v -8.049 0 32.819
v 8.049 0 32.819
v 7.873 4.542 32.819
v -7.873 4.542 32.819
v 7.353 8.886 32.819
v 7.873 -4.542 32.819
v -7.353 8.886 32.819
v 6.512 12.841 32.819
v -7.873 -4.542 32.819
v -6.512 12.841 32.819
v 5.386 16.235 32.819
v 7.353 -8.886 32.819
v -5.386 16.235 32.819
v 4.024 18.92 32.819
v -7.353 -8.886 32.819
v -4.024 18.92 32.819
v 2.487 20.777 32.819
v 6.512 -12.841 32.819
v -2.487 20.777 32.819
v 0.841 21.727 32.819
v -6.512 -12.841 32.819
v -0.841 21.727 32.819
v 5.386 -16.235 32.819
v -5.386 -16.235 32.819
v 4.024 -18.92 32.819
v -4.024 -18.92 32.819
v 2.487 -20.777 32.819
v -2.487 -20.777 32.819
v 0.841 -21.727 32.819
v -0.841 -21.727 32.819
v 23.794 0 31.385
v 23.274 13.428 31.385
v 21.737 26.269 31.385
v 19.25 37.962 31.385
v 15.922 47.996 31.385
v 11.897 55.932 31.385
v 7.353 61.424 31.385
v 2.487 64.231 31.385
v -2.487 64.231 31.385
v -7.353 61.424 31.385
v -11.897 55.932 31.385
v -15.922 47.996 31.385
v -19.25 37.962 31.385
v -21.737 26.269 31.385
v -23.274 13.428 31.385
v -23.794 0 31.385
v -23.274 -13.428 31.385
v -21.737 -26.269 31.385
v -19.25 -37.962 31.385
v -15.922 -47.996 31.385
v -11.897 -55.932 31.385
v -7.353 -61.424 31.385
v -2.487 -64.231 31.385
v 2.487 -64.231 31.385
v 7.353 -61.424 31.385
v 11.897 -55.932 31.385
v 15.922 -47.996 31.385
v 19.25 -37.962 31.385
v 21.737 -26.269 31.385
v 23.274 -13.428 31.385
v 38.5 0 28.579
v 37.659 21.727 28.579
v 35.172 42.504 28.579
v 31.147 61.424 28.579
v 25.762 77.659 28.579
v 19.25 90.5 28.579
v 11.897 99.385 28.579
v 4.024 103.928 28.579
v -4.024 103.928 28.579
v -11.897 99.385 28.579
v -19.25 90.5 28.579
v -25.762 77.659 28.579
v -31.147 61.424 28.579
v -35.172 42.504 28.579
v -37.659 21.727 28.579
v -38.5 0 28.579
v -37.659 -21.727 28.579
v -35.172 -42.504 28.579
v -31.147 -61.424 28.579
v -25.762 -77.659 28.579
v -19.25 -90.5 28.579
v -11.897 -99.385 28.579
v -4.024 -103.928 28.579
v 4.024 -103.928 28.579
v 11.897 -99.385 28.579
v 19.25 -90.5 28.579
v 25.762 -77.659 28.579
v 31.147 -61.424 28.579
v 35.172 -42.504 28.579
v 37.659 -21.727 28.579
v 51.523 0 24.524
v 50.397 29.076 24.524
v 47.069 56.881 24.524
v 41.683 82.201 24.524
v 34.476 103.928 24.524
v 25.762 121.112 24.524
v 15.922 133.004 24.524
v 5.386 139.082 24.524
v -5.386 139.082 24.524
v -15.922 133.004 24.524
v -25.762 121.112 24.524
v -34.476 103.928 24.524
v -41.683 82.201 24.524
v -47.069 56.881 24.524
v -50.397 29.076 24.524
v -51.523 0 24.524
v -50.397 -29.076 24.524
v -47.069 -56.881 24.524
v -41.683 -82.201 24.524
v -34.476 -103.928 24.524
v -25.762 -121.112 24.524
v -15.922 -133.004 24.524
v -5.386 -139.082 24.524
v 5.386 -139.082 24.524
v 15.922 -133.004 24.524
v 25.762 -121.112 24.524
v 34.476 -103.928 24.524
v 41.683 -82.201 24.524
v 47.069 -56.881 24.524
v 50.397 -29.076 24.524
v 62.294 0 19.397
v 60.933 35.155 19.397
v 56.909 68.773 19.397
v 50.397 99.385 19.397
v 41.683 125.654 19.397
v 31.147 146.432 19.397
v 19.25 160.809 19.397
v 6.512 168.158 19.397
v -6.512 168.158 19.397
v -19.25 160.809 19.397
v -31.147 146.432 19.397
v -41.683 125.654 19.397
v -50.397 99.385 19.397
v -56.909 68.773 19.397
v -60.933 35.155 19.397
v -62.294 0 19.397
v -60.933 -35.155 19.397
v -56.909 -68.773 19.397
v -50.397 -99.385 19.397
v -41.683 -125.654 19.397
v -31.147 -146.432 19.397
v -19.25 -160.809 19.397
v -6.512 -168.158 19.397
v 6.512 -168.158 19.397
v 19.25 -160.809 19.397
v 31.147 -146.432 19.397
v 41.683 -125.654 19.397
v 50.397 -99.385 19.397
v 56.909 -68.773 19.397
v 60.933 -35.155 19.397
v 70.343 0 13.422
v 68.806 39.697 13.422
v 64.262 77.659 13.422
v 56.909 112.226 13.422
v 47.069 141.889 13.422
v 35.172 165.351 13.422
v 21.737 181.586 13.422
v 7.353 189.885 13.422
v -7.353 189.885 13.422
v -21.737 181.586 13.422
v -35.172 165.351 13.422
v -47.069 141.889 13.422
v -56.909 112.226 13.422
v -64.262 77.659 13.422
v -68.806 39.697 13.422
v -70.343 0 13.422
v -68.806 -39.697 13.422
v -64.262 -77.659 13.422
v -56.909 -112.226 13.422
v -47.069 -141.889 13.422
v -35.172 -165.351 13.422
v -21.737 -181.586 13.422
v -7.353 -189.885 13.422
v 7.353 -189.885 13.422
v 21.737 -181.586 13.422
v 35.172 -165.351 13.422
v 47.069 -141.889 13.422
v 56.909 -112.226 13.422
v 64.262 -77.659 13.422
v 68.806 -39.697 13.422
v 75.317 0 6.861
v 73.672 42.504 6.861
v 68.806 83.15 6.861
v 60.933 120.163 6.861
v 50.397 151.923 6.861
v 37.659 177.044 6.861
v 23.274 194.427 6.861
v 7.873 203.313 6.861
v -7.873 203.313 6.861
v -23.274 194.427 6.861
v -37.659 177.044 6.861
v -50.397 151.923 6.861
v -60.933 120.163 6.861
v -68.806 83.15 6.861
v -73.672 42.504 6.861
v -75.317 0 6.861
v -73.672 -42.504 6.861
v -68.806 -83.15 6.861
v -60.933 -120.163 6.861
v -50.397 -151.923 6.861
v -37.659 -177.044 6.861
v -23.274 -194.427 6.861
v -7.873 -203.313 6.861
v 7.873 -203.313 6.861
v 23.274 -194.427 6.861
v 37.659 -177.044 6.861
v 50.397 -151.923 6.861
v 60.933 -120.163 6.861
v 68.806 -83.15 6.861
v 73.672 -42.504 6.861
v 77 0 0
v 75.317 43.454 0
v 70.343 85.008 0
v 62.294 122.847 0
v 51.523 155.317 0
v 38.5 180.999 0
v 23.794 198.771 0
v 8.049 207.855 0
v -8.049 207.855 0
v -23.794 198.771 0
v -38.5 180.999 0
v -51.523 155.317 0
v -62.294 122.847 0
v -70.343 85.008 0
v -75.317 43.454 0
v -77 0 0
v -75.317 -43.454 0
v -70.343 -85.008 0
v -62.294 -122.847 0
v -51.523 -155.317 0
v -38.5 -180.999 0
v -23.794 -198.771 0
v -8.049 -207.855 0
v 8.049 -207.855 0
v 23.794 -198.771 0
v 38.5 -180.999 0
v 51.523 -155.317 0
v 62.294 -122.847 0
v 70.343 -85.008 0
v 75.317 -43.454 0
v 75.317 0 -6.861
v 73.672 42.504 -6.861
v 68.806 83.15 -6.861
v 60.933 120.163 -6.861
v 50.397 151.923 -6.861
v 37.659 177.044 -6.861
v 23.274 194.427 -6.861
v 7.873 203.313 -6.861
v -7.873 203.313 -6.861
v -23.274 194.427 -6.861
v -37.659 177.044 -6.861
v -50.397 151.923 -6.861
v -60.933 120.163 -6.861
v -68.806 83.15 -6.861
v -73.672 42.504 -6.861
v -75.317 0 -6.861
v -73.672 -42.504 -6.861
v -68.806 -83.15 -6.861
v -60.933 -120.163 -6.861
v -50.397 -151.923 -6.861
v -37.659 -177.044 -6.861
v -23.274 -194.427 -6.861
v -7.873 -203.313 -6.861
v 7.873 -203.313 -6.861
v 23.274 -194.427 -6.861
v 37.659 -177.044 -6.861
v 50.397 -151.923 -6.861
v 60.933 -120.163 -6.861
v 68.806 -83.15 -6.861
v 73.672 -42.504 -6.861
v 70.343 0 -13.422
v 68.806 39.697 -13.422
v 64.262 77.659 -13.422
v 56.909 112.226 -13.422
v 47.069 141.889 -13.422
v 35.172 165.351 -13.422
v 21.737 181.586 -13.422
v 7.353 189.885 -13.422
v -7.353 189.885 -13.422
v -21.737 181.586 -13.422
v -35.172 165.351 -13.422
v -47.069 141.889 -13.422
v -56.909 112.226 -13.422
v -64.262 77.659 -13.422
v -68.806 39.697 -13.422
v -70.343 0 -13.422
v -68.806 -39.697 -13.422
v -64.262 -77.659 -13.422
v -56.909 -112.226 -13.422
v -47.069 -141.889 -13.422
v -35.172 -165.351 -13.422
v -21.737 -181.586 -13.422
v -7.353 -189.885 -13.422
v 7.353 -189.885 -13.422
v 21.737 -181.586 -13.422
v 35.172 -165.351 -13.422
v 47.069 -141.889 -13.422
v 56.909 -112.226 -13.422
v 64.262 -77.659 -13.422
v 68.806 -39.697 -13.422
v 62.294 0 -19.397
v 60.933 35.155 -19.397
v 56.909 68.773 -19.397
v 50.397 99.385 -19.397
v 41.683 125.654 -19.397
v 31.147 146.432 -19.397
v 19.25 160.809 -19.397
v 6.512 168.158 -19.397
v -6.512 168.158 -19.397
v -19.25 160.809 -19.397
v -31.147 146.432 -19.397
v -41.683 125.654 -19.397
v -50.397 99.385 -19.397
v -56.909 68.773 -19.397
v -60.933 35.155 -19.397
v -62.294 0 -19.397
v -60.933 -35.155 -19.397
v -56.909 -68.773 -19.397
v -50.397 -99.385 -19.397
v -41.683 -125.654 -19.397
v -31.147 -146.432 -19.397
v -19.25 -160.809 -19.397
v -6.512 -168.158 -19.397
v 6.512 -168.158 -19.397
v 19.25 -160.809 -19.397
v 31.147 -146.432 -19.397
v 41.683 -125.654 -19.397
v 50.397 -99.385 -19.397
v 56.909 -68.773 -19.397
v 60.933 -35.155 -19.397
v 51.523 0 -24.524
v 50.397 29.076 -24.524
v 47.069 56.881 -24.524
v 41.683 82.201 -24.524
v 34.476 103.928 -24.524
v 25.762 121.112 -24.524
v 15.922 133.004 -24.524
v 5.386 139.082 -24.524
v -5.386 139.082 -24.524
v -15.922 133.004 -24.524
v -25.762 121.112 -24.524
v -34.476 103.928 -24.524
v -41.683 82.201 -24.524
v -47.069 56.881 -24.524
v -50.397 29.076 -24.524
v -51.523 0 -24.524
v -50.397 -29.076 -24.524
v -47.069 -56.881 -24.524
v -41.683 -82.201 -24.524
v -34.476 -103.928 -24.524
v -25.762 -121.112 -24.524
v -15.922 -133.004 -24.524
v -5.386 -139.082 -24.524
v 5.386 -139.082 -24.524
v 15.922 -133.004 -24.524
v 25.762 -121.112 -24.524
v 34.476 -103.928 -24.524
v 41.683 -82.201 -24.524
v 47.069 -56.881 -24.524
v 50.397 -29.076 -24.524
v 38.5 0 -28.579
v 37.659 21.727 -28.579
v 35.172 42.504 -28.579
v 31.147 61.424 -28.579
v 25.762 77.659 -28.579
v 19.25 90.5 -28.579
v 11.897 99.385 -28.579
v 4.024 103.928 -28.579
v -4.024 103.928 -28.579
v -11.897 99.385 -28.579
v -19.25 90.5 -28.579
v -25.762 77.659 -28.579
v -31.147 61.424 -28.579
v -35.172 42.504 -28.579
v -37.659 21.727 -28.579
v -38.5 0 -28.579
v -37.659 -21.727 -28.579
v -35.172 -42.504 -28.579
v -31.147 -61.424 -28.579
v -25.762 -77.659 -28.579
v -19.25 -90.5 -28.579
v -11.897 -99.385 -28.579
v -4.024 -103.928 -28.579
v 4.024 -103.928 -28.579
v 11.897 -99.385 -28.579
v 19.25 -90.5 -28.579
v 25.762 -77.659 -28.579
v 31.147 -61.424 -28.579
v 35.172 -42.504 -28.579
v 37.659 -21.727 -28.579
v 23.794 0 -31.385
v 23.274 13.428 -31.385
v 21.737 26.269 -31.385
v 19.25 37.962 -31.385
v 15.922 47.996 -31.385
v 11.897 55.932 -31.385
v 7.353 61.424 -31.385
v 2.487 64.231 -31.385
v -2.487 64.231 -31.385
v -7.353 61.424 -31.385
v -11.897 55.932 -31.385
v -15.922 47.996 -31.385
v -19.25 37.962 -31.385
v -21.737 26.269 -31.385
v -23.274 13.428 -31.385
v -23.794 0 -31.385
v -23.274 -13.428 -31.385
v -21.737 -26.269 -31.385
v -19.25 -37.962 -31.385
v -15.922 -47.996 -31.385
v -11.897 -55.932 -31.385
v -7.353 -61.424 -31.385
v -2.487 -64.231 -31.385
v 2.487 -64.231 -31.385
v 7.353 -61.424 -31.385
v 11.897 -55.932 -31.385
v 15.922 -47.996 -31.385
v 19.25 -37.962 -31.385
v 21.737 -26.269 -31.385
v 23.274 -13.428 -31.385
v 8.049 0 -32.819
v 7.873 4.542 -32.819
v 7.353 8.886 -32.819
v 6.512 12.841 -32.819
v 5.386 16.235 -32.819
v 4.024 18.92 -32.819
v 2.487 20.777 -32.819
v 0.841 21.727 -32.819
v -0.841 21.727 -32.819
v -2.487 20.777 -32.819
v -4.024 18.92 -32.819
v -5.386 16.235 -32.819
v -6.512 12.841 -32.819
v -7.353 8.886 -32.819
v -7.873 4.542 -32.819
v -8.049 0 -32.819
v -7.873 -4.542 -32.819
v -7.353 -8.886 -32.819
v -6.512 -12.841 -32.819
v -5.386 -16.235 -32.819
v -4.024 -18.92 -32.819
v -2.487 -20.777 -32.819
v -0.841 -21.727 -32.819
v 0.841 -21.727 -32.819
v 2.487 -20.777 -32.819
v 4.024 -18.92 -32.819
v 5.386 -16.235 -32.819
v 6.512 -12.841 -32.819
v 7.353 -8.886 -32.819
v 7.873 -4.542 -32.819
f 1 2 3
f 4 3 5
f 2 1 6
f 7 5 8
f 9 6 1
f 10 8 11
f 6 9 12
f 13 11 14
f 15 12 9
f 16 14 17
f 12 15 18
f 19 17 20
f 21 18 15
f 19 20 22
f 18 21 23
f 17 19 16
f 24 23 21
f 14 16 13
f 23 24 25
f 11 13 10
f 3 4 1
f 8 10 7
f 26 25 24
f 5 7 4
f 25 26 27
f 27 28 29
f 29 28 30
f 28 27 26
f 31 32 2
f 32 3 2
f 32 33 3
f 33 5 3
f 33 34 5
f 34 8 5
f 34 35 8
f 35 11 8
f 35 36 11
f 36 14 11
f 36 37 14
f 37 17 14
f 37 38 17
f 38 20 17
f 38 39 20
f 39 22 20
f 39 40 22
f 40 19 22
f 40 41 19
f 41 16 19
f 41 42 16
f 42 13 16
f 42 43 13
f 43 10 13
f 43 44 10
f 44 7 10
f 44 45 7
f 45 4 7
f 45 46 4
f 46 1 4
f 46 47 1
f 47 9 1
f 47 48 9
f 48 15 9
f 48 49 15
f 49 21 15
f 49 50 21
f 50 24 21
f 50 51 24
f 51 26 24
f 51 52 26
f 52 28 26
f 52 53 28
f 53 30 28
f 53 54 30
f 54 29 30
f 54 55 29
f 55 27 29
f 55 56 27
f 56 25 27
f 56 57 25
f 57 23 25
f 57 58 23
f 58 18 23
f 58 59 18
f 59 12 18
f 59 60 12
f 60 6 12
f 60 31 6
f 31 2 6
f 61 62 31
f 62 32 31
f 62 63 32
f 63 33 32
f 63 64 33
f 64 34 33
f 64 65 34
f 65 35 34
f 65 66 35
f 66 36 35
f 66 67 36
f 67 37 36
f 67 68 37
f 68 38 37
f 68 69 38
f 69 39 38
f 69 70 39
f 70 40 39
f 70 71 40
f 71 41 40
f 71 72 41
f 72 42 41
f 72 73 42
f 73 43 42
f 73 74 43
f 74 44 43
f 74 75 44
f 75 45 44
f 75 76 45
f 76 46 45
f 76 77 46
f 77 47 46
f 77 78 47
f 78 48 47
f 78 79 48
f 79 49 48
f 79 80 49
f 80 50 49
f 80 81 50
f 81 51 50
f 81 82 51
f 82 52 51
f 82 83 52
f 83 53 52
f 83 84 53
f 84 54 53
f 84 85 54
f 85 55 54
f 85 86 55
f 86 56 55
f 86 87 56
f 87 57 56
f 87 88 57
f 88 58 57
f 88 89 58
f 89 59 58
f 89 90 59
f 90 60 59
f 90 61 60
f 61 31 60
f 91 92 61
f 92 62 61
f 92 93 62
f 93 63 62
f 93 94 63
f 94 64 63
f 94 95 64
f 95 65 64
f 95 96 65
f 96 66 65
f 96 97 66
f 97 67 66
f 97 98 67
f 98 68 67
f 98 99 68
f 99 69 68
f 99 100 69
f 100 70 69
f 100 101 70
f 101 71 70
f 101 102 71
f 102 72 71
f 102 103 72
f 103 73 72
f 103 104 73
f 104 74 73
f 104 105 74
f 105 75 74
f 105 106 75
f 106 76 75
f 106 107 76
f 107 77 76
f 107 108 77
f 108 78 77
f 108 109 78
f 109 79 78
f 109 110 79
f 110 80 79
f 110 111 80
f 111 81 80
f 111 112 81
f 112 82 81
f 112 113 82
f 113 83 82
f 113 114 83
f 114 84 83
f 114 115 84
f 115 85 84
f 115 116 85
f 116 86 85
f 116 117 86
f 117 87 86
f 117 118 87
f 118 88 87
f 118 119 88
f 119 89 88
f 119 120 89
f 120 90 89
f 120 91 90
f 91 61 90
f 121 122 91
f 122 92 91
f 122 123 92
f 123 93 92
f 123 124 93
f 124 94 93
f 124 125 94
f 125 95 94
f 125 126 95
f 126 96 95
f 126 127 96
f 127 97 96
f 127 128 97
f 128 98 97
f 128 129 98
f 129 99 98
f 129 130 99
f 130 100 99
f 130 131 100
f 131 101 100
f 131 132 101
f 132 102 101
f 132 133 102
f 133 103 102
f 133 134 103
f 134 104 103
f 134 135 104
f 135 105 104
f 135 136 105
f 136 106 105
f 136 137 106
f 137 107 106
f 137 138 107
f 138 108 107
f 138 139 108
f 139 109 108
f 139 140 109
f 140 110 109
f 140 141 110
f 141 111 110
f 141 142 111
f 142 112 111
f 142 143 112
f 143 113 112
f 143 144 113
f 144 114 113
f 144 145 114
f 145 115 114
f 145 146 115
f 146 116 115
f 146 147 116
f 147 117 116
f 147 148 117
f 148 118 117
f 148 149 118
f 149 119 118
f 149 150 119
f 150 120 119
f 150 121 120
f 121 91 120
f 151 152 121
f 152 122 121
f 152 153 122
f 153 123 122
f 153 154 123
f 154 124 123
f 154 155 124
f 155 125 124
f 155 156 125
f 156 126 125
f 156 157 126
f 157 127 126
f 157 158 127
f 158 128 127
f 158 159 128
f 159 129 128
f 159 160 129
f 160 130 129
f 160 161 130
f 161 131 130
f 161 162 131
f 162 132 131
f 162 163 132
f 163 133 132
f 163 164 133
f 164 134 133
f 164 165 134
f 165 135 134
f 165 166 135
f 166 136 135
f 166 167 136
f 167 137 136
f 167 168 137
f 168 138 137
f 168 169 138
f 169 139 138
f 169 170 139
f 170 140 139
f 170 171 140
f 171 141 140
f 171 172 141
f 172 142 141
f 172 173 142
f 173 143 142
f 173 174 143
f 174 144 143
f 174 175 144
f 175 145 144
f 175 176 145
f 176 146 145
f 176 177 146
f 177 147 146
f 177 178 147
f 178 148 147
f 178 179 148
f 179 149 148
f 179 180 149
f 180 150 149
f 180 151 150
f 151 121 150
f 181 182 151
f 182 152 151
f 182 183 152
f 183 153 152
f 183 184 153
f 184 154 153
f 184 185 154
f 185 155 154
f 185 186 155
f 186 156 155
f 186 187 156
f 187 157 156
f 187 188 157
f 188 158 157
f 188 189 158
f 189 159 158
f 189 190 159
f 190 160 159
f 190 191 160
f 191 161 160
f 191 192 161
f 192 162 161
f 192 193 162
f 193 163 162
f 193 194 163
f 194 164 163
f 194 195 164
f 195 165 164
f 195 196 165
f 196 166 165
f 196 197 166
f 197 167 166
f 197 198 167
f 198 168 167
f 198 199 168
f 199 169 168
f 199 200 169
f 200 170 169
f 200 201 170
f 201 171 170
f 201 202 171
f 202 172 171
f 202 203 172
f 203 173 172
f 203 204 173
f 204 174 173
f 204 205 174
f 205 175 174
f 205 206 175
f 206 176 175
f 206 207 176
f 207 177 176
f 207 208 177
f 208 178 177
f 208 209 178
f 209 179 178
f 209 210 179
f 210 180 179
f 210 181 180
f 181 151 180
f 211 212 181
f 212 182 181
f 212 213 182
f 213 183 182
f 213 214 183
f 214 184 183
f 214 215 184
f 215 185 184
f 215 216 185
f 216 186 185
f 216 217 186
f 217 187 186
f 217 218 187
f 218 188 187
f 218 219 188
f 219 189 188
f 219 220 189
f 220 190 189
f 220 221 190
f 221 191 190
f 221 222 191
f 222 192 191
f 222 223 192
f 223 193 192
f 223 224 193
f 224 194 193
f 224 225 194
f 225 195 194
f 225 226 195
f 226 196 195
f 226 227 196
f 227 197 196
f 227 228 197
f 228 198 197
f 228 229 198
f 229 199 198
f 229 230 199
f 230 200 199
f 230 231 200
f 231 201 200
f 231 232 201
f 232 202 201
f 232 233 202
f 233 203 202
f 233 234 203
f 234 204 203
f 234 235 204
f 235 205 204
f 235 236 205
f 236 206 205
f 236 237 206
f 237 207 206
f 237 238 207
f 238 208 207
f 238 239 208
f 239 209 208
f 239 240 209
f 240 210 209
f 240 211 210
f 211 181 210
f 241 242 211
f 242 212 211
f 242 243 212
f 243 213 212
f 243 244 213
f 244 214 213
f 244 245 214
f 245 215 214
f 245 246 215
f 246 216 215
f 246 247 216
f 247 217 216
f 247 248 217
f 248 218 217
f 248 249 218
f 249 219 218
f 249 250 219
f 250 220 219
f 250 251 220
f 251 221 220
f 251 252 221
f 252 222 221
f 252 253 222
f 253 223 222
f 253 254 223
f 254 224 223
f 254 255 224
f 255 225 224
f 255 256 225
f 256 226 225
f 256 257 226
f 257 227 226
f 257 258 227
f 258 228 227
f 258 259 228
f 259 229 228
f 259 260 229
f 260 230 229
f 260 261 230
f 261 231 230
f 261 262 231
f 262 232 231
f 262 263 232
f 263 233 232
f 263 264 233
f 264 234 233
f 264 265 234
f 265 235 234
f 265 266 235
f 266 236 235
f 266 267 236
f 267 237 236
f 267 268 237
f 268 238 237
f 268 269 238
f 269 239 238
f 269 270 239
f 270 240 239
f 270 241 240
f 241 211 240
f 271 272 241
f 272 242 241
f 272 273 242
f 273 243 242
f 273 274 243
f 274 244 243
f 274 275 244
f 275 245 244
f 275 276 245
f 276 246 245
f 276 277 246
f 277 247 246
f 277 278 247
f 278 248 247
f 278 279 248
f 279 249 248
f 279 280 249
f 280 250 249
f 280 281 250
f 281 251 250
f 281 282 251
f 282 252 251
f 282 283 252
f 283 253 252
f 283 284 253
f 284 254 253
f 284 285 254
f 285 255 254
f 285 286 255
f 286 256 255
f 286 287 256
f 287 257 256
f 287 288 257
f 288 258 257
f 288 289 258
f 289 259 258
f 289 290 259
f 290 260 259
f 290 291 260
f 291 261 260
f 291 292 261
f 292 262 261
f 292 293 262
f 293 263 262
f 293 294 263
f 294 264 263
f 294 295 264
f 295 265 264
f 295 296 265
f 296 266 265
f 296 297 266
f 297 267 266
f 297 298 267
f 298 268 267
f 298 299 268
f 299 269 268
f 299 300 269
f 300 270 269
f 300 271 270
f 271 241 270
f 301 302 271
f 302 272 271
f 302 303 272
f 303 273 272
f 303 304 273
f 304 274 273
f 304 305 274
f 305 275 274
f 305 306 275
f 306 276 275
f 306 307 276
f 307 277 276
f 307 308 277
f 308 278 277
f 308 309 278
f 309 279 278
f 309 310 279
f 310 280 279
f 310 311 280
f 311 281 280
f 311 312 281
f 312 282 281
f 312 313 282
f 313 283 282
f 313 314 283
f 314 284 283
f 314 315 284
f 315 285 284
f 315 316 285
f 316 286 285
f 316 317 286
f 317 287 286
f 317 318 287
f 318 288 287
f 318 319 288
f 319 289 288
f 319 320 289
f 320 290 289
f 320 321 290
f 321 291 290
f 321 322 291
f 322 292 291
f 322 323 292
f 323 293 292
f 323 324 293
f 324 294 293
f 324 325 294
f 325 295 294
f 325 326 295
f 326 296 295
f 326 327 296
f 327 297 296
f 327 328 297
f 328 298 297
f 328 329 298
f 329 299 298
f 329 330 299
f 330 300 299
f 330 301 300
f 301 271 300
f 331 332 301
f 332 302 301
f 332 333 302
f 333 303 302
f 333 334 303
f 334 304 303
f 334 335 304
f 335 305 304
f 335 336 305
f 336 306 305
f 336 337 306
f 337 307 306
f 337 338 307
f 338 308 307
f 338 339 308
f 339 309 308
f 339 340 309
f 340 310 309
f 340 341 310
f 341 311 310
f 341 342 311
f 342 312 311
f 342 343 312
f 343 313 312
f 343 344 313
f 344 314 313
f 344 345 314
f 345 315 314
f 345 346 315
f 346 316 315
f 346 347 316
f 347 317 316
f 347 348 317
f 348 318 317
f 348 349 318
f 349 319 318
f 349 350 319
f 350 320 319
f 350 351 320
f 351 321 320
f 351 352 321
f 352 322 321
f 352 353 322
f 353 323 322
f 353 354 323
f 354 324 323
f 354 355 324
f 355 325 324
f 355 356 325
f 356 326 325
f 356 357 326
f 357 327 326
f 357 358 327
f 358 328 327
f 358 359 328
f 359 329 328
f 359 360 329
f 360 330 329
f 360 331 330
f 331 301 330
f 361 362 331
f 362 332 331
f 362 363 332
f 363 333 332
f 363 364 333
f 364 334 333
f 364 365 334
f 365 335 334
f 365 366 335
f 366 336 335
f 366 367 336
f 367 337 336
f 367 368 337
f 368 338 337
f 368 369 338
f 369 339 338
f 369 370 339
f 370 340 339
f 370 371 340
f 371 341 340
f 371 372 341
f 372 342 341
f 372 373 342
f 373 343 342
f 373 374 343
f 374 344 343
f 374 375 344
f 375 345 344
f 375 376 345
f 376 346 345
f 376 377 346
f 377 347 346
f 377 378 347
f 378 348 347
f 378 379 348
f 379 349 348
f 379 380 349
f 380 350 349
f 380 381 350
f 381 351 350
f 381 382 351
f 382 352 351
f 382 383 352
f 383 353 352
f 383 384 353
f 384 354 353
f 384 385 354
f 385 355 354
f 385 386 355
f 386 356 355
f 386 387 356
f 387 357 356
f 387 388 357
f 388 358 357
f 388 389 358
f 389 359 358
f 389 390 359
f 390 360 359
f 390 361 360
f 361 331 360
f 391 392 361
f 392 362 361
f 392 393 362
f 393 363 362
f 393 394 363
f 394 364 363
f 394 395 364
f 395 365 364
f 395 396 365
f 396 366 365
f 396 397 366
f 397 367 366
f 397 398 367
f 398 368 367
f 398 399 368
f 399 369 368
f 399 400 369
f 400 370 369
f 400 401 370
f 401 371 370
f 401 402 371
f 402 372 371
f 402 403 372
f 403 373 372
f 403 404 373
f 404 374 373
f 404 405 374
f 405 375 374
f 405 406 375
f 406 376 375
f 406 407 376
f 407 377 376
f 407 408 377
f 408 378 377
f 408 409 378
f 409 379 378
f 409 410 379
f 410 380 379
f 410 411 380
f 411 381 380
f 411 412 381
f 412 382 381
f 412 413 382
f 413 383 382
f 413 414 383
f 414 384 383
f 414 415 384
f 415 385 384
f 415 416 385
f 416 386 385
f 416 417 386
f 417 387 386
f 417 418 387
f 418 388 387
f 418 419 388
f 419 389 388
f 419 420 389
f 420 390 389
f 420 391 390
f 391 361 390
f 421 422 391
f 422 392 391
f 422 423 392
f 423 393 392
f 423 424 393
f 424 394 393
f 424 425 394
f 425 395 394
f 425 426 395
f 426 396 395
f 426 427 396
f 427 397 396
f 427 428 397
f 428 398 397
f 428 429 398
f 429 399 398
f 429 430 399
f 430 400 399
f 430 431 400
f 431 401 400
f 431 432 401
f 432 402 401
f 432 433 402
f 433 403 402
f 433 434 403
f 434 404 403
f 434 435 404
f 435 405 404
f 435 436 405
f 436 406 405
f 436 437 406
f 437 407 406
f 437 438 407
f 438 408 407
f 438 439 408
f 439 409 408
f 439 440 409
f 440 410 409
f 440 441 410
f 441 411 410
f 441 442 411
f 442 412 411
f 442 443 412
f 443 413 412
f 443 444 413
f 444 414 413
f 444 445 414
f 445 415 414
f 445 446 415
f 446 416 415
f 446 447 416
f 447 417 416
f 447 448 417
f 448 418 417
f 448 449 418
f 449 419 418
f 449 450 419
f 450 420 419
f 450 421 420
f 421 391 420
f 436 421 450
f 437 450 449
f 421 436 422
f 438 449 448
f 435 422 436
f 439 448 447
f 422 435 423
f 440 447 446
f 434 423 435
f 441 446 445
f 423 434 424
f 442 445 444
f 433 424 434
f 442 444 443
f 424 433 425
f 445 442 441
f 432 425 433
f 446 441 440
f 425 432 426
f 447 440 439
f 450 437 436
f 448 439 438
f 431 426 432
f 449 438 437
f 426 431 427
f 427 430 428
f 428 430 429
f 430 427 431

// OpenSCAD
// Generated by SolidPython 1.0.1 on 2020-07-29 00:46:48


scale(v = [7, 19, 3]) {
	sphere(r = 11);
}
/***********************************************
*********      SolidPython code:      **********
************************************************
 
# import packages: SolidPython
from solid import *
from solid.utils import *
from itertools import chain, combinations, permutations


class Resize:

    def __init__(self, scad_file):
        self.scad_file = scad_file
        #self.scad_file = import_scad(scad_file)
        # cone/cylinder param:
        self.r1 = 0
        self.r2 = 0
        self.h = 0
        # rectangular prism param:
        self.w = 0
        self.l = 0
        # ellipse param:
        self.r = 0

    # import OpenScad code (file name corresponds to shape)


    # classify shape + parameters
    def assign(self, param1, param2, param3):
        if self.scad_file == 'cone.scad':
            self.r1 = param1
            self.r2 = param2
            self.h = param3
        elif self.scad_file == 'cylinder.scad':
            self.r1 = param1
            self.r2 = param2
            self.h = param3
        elif self.scad_file == 'rectangularPrism.scad':
            self.h = param1
            self.l = param2
            self.w = param3
        else:
            self.r = param1
            self.h = param2

    # resize parameters
    def iterate(self):
        x = range(3, 20, 2)
        i = 1
        if self.scad_file == 'cone.scad':
            tempList = list(permutations(x, 2))
            for temp in tempList:
                param1 = temp[0]
                param2 = temp[1]
                filepath = 'produced_scad_files/' + 'cone' + str(param1) + '_' + str(param2) + '_' + '.scad'
                scad_render_to_file(cylinder(h=param1, r1=param2, r2=0), filepath)

        elif self.scad_file == 'cylinder.scad':
            tempList = list(permutations(x, 3))
            for temp in tempList:
                param1 = temp[0]
                param2 = temp[1]
                filepath = 'produced_scad_files/' + 'cylinder' + str(param1) + '_' + str(param2) + '_' + '.scad'
                scad_render_to_file(cylinder(h=param1, r1=param2, r2=param2), filepath)

        elif self.scad_file == 'rectangularPrism.scad':
            tempList = list(permutations(x, 3))
            for temp in tempList:
                param1 = temp[0]
                param2 = temp[1]
                param3 = temp[2]
                filepath = 'produced_scad_files/' + 'rectangularPrism' + str(param1) + '_' + str(param2) + '_' + str(
                    param3) + '.scad'
                scad_render_to_file(cube(size=(param1, param2, param3)), filepath)

        elif self.scad_file == 'ellipse.scad':
            tempList = list(permutations(x, 4))
            for temp in tempList:
                param1 = temp[0]
                param2 = temp[1]
                param3 = temp[2]
                param4 = temp[3]
                filepath = 'produced_scad_files/' + 'ellipse' + str(param1) + '_' + str(param2) + '_' + str(param3) + '_' + str(param4) + '.scad'
                scad_render_to_file(scale([param1, param2, param3])(sphere(r=param4)), filepath)

    def render_to_scadfile(self):
        scad_render_to_file(scad, 'example.scad') 
 
************************************************/
